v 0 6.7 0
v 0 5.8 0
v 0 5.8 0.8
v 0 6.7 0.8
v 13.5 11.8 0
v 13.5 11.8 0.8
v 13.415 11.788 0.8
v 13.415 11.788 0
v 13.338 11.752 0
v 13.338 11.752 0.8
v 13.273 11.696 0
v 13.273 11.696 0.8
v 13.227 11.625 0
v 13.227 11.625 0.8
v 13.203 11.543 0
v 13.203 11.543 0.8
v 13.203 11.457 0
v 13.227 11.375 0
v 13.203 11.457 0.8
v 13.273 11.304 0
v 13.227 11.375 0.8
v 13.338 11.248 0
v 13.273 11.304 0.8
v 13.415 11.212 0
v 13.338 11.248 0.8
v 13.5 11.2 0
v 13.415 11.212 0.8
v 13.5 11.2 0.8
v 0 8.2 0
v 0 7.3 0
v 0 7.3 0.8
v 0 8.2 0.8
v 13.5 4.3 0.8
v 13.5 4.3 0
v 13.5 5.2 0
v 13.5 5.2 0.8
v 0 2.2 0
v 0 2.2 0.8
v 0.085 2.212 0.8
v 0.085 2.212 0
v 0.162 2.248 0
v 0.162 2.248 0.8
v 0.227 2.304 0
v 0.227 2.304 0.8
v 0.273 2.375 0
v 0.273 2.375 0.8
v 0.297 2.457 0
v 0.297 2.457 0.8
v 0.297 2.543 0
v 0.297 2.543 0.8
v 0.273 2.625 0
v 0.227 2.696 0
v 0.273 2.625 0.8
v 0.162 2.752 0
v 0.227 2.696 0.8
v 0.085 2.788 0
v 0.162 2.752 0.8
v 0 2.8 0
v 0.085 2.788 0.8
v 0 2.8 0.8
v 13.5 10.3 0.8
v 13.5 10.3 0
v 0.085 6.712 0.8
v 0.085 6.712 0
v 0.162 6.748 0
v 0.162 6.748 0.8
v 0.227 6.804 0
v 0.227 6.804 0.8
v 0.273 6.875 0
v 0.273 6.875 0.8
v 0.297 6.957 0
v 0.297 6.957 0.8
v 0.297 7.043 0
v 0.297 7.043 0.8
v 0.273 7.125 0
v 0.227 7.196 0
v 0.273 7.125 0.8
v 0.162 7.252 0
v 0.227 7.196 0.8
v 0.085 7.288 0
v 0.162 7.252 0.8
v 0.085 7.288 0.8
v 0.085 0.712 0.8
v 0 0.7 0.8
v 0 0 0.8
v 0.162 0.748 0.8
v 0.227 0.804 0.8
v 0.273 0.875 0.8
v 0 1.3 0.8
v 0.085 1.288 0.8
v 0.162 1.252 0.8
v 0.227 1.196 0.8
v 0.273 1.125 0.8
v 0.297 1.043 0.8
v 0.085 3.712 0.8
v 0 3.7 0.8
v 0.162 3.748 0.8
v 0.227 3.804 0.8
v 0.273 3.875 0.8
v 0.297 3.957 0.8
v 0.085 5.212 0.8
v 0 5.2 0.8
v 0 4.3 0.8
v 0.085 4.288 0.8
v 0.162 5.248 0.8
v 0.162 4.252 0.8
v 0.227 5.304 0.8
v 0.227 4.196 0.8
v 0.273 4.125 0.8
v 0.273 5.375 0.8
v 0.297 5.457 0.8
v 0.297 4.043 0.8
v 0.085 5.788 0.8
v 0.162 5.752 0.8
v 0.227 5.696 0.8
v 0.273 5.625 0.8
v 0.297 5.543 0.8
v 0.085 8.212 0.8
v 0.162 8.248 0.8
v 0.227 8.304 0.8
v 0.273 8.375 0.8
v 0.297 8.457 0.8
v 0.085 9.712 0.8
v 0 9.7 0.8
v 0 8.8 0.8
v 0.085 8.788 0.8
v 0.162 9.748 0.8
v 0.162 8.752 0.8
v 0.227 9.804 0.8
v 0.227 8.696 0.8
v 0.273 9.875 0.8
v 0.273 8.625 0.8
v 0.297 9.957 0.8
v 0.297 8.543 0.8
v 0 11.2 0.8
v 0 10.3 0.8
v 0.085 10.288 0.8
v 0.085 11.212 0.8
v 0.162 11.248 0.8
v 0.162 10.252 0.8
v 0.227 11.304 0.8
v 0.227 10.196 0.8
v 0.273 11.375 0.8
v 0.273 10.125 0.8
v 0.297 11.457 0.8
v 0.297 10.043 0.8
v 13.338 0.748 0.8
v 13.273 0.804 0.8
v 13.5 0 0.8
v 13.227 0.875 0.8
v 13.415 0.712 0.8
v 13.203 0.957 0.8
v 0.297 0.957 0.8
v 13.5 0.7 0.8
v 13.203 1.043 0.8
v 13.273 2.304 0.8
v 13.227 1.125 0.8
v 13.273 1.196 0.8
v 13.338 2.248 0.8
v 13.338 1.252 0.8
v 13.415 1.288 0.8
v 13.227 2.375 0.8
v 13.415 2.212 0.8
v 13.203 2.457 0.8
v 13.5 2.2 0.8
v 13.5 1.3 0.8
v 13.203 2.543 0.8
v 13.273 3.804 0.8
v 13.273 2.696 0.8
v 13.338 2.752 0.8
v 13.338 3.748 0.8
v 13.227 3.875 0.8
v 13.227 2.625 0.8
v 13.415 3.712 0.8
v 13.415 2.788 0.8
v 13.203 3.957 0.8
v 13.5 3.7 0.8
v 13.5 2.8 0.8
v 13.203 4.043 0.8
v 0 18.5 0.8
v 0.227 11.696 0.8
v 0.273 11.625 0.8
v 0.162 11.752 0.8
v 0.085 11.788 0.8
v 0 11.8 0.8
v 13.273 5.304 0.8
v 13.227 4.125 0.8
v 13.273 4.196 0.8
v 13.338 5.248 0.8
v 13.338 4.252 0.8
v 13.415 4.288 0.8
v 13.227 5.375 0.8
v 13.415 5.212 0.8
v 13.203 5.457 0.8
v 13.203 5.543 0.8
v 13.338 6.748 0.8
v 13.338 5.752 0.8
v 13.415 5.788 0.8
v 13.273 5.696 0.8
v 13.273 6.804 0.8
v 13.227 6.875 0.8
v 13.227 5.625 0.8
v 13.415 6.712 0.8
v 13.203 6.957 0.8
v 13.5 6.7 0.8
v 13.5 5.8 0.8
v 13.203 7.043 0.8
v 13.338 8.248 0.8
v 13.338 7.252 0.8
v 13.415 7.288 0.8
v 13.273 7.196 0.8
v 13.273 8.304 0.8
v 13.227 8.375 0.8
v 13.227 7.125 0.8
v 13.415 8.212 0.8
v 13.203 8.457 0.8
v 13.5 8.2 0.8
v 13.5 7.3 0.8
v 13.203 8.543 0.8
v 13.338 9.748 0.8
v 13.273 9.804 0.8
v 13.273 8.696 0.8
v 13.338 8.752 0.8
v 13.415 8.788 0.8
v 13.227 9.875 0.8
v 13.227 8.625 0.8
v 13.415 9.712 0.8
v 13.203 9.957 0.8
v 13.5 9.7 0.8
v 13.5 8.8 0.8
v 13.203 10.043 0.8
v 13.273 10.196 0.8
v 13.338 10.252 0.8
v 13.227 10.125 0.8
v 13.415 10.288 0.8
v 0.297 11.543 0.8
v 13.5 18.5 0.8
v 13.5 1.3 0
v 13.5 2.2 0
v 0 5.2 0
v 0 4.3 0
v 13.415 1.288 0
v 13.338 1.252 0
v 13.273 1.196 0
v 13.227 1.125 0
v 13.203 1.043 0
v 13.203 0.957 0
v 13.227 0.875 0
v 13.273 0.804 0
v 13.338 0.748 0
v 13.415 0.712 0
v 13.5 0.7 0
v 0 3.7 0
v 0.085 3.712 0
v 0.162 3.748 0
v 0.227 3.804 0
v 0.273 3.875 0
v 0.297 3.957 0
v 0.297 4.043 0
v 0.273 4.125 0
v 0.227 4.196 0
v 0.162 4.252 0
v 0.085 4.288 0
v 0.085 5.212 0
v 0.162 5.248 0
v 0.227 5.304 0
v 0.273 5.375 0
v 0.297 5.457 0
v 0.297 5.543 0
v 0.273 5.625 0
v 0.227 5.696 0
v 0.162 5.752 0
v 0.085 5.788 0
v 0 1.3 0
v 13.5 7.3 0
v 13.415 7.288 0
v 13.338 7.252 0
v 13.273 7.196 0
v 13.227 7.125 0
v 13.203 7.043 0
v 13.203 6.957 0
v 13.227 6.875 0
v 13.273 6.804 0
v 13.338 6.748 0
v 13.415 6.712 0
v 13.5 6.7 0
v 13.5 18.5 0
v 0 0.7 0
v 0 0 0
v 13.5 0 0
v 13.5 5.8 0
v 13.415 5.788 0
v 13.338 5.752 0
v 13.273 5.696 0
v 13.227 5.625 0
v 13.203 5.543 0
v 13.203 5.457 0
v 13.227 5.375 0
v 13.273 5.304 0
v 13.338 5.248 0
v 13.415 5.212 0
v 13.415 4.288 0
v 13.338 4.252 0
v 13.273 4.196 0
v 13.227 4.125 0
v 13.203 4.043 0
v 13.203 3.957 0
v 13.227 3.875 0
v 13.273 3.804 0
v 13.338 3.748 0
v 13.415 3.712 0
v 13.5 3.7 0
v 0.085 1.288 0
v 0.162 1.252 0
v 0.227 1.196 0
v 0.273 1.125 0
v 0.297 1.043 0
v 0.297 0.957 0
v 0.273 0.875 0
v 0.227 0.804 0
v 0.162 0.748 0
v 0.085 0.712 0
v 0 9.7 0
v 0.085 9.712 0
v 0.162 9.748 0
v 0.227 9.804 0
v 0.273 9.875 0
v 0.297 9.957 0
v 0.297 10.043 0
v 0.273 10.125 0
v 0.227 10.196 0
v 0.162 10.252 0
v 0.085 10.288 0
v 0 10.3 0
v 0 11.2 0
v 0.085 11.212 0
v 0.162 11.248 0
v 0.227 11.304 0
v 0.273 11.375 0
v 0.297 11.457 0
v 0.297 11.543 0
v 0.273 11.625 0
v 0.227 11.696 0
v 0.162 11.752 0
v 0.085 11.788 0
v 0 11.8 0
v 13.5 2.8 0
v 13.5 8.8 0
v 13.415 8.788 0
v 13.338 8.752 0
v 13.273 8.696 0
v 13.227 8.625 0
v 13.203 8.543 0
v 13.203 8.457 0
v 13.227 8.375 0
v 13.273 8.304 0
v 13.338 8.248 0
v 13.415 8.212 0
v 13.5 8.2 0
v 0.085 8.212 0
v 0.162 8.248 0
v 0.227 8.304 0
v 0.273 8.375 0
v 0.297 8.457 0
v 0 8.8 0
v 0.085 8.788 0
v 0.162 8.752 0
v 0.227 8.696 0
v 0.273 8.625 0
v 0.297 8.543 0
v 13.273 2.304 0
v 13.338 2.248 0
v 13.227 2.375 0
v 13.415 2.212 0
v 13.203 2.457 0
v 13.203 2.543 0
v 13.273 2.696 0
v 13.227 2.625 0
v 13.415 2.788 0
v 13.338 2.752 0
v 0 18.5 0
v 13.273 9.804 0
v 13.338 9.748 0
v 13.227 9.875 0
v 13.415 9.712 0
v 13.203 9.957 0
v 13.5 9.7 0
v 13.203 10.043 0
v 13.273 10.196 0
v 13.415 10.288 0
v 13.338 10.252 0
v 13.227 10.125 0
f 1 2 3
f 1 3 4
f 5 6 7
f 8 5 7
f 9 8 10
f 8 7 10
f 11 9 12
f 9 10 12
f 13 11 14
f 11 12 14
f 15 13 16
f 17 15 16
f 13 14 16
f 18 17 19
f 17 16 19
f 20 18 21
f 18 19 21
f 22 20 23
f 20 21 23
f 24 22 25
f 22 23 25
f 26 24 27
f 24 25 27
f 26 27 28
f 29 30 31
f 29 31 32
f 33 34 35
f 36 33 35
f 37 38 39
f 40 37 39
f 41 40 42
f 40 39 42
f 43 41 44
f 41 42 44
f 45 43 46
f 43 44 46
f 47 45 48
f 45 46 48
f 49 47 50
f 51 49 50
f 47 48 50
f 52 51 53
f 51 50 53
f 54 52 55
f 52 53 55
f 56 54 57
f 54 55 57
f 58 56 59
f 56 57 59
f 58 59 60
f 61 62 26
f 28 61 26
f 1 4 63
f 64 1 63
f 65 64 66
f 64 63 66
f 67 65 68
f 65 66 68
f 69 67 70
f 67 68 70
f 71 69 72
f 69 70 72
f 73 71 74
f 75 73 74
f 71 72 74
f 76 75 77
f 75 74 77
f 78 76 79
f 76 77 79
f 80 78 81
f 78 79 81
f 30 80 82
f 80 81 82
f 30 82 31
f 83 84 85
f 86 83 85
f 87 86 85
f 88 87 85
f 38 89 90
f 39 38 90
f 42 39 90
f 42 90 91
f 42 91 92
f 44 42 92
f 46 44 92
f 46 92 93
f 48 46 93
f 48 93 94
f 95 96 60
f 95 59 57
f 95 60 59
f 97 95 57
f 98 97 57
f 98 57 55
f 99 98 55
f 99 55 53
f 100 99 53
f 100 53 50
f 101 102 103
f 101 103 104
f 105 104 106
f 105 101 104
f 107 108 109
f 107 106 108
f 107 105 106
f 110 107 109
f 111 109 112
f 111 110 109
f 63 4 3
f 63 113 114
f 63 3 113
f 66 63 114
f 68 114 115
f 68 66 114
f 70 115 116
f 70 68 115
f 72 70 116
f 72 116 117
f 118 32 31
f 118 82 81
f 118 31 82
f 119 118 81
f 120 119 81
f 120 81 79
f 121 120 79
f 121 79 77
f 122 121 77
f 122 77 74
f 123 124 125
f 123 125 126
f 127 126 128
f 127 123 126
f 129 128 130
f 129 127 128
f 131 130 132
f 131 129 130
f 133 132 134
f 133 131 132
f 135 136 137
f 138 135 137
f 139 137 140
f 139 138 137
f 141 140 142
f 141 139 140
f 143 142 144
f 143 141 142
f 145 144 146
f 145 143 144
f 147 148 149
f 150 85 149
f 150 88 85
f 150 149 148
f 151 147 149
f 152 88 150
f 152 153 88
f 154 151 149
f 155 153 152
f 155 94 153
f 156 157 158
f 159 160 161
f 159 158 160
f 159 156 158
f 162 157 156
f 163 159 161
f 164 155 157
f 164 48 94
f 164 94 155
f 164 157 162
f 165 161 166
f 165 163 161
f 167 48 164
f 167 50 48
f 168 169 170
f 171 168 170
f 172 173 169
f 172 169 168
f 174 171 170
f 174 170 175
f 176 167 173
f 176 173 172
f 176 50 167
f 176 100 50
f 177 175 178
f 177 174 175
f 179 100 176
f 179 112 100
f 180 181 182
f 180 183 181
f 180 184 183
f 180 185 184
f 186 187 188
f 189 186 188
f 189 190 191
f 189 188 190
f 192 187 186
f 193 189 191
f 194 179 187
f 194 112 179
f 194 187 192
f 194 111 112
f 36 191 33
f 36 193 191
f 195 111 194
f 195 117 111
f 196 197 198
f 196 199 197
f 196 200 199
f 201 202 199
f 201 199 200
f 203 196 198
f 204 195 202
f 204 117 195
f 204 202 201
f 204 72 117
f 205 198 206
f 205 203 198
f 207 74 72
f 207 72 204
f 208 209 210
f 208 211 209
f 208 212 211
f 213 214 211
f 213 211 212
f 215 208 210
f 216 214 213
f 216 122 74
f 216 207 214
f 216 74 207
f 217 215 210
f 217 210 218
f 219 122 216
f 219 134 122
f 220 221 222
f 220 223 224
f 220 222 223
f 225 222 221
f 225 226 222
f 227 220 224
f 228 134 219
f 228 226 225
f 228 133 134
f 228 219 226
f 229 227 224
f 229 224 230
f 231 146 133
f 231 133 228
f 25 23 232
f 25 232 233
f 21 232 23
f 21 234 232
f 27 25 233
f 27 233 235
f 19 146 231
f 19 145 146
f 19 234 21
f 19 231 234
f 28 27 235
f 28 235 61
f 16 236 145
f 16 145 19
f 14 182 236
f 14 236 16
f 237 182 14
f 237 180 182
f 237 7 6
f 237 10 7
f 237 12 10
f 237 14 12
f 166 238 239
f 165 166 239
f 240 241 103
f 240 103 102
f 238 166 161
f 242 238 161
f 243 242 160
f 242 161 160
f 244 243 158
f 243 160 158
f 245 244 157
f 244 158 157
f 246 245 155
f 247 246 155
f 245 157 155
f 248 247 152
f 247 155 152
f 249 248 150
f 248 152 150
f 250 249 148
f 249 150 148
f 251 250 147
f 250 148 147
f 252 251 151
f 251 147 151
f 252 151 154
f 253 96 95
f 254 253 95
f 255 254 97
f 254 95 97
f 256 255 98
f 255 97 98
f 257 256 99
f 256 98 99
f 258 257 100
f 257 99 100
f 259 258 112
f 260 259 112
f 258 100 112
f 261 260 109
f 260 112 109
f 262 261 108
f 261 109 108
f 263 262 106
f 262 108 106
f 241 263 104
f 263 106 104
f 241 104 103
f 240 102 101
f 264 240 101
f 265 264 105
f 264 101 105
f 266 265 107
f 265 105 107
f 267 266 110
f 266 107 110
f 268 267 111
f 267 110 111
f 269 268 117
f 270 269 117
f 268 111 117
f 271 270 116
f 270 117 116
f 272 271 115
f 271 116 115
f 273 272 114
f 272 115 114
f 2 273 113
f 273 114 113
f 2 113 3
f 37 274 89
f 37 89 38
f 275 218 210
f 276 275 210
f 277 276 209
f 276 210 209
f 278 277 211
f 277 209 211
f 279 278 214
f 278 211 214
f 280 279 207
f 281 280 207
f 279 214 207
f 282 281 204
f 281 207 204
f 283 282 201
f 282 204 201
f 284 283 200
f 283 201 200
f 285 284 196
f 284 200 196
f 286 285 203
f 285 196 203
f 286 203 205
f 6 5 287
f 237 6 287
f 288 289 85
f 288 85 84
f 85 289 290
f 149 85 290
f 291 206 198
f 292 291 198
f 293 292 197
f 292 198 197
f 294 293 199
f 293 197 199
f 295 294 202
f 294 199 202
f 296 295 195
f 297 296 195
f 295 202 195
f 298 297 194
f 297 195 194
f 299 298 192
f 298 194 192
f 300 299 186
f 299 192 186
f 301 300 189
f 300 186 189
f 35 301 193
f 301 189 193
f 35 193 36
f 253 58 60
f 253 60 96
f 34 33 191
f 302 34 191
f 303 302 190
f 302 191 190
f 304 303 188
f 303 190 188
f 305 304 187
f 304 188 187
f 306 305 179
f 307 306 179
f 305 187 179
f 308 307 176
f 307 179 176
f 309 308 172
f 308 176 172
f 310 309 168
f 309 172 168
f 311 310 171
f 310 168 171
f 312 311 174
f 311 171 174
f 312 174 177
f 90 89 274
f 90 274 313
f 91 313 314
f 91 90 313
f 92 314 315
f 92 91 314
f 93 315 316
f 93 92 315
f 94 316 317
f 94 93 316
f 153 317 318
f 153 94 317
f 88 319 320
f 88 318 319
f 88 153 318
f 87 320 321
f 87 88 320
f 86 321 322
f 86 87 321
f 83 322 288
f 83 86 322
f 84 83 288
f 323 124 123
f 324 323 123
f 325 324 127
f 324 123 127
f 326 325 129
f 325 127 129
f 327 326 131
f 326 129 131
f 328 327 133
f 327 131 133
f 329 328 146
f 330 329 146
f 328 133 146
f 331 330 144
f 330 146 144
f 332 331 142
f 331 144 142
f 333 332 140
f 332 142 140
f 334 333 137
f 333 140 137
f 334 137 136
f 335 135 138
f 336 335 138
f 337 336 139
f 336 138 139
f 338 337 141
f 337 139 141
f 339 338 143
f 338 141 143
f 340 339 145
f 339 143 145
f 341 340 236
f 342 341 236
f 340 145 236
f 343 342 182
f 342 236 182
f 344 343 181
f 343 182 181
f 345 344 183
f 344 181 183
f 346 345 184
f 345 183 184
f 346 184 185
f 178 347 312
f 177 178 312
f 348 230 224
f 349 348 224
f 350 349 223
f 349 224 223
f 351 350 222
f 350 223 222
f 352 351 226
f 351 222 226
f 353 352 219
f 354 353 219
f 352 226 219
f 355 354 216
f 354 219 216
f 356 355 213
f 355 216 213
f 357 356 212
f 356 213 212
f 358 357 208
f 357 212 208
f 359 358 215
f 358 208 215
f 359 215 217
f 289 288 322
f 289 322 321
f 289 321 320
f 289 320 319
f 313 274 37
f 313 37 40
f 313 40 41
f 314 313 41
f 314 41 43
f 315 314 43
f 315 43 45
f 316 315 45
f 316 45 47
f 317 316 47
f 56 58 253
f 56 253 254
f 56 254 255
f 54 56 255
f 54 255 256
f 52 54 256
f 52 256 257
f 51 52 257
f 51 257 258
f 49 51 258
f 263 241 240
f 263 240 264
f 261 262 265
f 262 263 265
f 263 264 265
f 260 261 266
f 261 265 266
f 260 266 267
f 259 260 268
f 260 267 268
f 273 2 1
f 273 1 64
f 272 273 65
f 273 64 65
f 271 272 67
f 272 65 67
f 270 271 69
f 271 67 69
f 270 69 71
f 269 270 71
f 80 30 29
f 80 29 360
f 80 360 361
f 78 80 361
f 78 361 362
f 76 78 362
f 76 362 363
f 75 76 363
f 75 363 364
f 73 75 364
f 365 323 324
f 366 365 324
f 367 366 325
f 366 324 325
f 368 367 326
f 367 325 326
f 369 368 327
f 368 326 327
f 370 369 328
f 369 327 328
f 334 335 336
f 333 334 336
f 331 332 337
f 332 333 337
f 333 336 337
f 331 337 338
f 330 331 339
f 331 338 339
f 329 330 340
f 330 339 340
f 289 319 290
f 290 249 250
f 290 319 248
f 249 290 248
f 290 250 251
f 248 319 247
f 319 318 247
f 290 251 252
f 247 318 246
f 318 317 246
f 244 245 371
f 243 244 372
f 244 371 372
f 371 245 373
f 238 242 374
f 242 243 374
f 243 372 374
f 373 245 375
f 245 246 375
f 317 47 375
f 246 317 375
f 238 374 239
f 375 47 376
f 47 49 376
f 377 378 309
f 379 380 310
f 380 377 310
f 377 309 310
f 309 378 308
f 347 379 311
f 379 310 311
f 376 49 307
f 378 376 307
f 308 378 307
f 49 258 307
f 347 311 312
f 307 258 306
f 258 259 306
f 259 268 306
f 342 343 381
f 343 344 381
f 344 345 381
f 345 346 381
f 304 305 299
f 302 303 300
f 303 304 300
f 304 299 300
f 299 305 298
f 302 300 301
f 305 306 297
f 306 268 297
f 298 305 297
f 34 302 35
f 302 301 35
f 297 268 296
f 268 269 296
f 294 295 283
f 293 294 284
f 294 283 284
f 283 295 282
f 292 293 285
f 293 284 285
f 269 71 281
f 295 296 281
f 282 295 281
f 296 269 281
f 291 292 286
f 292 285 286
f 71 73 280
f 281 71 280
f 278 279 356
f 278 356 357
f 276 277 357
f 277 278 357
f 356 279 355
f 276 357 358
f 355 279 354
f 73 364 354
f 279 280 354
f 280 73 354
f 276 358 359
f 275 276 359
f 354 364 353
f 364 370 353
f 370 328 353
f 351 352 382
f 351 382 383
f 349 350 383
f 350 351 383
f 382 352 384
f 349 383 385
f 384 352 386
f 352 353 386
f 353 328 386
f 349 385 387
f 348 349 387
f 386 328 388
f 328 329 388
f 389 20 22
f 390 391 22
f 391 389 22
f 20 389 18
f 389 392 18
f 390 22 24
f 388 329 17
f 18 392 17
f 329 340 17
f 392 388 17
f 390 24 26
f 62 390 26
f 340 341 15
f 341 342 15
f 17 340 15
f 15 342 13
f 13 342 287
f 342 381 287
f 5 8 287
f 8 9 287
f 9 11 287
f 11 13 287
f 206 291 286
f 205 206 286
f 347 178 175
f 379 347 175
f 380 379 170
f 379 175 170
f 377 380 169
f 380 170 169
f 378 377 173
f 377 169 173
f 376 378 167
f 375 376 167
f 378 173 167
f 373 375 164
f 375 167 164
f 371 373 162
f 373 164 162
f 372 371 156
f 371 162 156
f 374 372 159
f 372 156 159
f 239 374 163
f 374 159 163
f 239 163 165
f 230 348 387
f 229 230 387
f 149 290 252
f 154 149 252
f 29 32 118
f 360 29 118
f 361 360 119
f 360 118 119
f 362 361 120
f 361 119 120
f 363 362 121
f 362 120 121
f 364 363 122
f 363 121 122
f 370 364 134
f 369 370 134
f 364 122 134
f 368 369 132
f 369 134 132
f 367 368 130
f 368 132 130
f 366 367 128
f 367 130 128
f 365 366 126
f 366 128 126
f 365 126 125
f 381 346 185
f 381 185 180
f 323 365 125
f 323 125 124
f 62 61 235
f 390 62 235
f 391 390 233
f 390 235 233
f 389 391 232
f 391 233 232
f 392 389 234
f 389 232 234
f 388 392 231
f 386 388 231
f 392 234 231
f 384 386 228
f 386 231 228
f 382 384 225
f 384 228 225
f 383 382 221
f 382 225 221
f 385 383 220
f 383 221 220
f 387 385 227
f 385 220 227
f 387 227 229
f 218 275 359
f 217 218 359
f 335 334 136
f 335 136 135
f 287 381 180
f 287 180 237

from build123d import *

# Parameters (mm, degrees)
ESBO_O1_W                 = 13.5
ESBO_O1_H                 = 18.5
RESSALTO_EXTRUS_O1_DEPTH  = 0.8
ESBO_O2_R                 = 0.3
CORTE_EXTRUS_O1_DEPTH     = 23.915933322
PADR_O_LINEAR1_COUNT      = 8
PADR_O_LINEAR1_PITCH      = 1.5
ESPELHAR1_COPY_1_SKETCH_R = 0.3
ESPELHAR1_COPY_1_DEPTH    = 23.915933322
ESPELHAR1_COPY_2_SKETCH_R = 0.3
ESPELHAR1_COPY_2_DEPTH    = 23.915933322
ESPELHAR1_COPY_3_SKETCH_R = 0.3
ESPELHAR1_COPY_3_DEPTH    = 23.915933322
ESPELHAR1_COPY_4_SKETCH_R = 0.3
ESPELHAR1_COPY_4_DEPTH    = 23.915933322
ESPELHAR1_COPY_5_SKETCH_R = 0.3
ESPELHAR1_COPY_5_DEPTH    = 23.915933322
ESPELHAR1_COPY_6_SKETCH_R = 0.3
ESPELHAR1_COPY_6_DEPTH    = 23.915933322
ESPELHAR1_COPY_7_SKETCH_R = 0.3
ESPELHAR1_COPY_7_DEPTH    = 23.915933322


with BuildPart() as part:
    # Esboço1 → Ressalto-extrusão1 (new body)
    with BuildSketch(Plane.XY):
        with Locations((6.75, 9.25)):
            Rectangle(ESBO_O1_W, ESBO_O1_H)
    extrude(amount=RESSALTO_EXTRUS_O1_DEPTH)

    # Esboço2 → Corte-extrusão1 (cut, through all)
    with BuildSketch(Plane.XY.offset(0.8)):
        with Locations((13.5, 1)):
            Circle(ESBO_O2_R)
    corte_extrus_o1 = extrude(amount=-CORTE_EXTRUS_O1_DEPTH, mode=Mode.SUBTRACT)

    # Padrão linear1: Corte-extrusão1 ×8
    with Locations(*[(0, i * PADR_O_LINEAR1_PITCH, 0) for i in range(1, PADR_O_LINEAR1_COUNT)]):
        add(corte_extrus_o1, mode=Mode.SUBTRACT)

    # Espelhar1: Corte-extrusão1 across plane
    add(corte_extrus_o1.mirror(Plane.ZY.offset(-6.75)), mode=Mode.SUBTRACT)

    # Espelhar1 copy 1 sketch → Espelhar1 copy 1 (cut, through all)
    with BuildSketch(Plane(origin=(13.5, 1.5, 0.8), x_dir=(-1, 0, 0), z_dir=(0, 0, 1))):
        with Locations((13.5, -1)):
            Circle(ESPELHAR1_COPY_1_SKETCH_R)
    extrude(amount=-ESPELHAR1_COPY_1_DEPTH, mode=Mode.SUBTRACT)

    # Espelhar1 copy 2 sketch → Espelhar1 copy 2 (cut, through all)
    with BuildSketch(Plane(origin=(13.5, 3, 0.8), x_dir=(-1, 0, 0), z_dir=(0, 0, 1))):
        with Locations((13.5, -1)):
            Circle(ESPELHAR1_COPY_2_SKETCH_R)
    extrude(amount=-ESPELHAR1_COPY_2_DEPTH, mode=Mode.SUBTRACT)

    # Espelhar1 copy 3 sketch → Espelhar1 copy 3 (cut, through all)
    with BuildSketch(Plane(origin=(13.5, 4.5, 0.8), x_dir=(-1, 0, 0), z_dir=(0, 0, 1))):
        with Locations((13.5, -1)):
            Circle(ESPELHAR1_COPY_3_SKETCH_R)
    extrude(amount=-ESPELHAR1_COPY_3_DEPTH, mode=Mode.SUBTRACT)

    # Espelhar1 copy 4 sketch → Espelhar1 copy 4 (cut, through all)
    with BuildSketch(Plane(origin=(13.5, 6, 0.8), x_dir=(-1, 0, 0), z_dir=(0, 0, 1))):
        with Locations((13.5, -1)):
            Circle(ESPELHAR1_COPY_4_SKETCH_R)
    extrude(amount=-ESPELHAR1_COPY_4_DEPTH, mode=Mode.SUBTRACT)

    # Espelhar1 copy 5 sketch → Espelhar1 copy 5 (cut, through all)
    with BuildSketch(Plane(origin=(13.5, 7.5, 0.8), x_dir=(-1, 0, 0), z_dir=(0, 0, 1))):
        with Locations((13.5, -1)):
            Circle(ESPELHAR1_COPY_5_SKETCH_R)
    extrude(amount=-ESPELHAR1_COPY_5_DEPTH, mode=Mode.SUBTRACT)

    # Espelhar1 copy 6 sketch → Espelhar1 copy 6 (cut, through all)
    with BuildSketch(Plane(origin=(13.5, 9, 0.8), x_dir=(-1, 0, 0), z_dir=(0, 0, 1))):
        with Locations((13.5, -1)):
            Circle(ESPELHAR1_COPY_6_SKETCH_R)
    extrude(amount=-ESPELHAR1_COPY_6_DEPTH, mode=Mode.SUBTRACT)

    # Espelhar1 copy 7 sketch → Espelhar1 copy 7 (cut, through all)
    with BuildSketch(Plane(origin=(13.5, 10.5, 0.8), x_dir=(-1, 0, 0), z_dir=(0, 0, 1))):
        with Locations((13.5, -1)):
            Circle(ESPELHAR1_COPY_7_SKETCH_R)
    extrude(amount=-ESPELHAR1_COPY_7_DEPTH, mode=Mode.SUBTRACT)


solid = part.part
